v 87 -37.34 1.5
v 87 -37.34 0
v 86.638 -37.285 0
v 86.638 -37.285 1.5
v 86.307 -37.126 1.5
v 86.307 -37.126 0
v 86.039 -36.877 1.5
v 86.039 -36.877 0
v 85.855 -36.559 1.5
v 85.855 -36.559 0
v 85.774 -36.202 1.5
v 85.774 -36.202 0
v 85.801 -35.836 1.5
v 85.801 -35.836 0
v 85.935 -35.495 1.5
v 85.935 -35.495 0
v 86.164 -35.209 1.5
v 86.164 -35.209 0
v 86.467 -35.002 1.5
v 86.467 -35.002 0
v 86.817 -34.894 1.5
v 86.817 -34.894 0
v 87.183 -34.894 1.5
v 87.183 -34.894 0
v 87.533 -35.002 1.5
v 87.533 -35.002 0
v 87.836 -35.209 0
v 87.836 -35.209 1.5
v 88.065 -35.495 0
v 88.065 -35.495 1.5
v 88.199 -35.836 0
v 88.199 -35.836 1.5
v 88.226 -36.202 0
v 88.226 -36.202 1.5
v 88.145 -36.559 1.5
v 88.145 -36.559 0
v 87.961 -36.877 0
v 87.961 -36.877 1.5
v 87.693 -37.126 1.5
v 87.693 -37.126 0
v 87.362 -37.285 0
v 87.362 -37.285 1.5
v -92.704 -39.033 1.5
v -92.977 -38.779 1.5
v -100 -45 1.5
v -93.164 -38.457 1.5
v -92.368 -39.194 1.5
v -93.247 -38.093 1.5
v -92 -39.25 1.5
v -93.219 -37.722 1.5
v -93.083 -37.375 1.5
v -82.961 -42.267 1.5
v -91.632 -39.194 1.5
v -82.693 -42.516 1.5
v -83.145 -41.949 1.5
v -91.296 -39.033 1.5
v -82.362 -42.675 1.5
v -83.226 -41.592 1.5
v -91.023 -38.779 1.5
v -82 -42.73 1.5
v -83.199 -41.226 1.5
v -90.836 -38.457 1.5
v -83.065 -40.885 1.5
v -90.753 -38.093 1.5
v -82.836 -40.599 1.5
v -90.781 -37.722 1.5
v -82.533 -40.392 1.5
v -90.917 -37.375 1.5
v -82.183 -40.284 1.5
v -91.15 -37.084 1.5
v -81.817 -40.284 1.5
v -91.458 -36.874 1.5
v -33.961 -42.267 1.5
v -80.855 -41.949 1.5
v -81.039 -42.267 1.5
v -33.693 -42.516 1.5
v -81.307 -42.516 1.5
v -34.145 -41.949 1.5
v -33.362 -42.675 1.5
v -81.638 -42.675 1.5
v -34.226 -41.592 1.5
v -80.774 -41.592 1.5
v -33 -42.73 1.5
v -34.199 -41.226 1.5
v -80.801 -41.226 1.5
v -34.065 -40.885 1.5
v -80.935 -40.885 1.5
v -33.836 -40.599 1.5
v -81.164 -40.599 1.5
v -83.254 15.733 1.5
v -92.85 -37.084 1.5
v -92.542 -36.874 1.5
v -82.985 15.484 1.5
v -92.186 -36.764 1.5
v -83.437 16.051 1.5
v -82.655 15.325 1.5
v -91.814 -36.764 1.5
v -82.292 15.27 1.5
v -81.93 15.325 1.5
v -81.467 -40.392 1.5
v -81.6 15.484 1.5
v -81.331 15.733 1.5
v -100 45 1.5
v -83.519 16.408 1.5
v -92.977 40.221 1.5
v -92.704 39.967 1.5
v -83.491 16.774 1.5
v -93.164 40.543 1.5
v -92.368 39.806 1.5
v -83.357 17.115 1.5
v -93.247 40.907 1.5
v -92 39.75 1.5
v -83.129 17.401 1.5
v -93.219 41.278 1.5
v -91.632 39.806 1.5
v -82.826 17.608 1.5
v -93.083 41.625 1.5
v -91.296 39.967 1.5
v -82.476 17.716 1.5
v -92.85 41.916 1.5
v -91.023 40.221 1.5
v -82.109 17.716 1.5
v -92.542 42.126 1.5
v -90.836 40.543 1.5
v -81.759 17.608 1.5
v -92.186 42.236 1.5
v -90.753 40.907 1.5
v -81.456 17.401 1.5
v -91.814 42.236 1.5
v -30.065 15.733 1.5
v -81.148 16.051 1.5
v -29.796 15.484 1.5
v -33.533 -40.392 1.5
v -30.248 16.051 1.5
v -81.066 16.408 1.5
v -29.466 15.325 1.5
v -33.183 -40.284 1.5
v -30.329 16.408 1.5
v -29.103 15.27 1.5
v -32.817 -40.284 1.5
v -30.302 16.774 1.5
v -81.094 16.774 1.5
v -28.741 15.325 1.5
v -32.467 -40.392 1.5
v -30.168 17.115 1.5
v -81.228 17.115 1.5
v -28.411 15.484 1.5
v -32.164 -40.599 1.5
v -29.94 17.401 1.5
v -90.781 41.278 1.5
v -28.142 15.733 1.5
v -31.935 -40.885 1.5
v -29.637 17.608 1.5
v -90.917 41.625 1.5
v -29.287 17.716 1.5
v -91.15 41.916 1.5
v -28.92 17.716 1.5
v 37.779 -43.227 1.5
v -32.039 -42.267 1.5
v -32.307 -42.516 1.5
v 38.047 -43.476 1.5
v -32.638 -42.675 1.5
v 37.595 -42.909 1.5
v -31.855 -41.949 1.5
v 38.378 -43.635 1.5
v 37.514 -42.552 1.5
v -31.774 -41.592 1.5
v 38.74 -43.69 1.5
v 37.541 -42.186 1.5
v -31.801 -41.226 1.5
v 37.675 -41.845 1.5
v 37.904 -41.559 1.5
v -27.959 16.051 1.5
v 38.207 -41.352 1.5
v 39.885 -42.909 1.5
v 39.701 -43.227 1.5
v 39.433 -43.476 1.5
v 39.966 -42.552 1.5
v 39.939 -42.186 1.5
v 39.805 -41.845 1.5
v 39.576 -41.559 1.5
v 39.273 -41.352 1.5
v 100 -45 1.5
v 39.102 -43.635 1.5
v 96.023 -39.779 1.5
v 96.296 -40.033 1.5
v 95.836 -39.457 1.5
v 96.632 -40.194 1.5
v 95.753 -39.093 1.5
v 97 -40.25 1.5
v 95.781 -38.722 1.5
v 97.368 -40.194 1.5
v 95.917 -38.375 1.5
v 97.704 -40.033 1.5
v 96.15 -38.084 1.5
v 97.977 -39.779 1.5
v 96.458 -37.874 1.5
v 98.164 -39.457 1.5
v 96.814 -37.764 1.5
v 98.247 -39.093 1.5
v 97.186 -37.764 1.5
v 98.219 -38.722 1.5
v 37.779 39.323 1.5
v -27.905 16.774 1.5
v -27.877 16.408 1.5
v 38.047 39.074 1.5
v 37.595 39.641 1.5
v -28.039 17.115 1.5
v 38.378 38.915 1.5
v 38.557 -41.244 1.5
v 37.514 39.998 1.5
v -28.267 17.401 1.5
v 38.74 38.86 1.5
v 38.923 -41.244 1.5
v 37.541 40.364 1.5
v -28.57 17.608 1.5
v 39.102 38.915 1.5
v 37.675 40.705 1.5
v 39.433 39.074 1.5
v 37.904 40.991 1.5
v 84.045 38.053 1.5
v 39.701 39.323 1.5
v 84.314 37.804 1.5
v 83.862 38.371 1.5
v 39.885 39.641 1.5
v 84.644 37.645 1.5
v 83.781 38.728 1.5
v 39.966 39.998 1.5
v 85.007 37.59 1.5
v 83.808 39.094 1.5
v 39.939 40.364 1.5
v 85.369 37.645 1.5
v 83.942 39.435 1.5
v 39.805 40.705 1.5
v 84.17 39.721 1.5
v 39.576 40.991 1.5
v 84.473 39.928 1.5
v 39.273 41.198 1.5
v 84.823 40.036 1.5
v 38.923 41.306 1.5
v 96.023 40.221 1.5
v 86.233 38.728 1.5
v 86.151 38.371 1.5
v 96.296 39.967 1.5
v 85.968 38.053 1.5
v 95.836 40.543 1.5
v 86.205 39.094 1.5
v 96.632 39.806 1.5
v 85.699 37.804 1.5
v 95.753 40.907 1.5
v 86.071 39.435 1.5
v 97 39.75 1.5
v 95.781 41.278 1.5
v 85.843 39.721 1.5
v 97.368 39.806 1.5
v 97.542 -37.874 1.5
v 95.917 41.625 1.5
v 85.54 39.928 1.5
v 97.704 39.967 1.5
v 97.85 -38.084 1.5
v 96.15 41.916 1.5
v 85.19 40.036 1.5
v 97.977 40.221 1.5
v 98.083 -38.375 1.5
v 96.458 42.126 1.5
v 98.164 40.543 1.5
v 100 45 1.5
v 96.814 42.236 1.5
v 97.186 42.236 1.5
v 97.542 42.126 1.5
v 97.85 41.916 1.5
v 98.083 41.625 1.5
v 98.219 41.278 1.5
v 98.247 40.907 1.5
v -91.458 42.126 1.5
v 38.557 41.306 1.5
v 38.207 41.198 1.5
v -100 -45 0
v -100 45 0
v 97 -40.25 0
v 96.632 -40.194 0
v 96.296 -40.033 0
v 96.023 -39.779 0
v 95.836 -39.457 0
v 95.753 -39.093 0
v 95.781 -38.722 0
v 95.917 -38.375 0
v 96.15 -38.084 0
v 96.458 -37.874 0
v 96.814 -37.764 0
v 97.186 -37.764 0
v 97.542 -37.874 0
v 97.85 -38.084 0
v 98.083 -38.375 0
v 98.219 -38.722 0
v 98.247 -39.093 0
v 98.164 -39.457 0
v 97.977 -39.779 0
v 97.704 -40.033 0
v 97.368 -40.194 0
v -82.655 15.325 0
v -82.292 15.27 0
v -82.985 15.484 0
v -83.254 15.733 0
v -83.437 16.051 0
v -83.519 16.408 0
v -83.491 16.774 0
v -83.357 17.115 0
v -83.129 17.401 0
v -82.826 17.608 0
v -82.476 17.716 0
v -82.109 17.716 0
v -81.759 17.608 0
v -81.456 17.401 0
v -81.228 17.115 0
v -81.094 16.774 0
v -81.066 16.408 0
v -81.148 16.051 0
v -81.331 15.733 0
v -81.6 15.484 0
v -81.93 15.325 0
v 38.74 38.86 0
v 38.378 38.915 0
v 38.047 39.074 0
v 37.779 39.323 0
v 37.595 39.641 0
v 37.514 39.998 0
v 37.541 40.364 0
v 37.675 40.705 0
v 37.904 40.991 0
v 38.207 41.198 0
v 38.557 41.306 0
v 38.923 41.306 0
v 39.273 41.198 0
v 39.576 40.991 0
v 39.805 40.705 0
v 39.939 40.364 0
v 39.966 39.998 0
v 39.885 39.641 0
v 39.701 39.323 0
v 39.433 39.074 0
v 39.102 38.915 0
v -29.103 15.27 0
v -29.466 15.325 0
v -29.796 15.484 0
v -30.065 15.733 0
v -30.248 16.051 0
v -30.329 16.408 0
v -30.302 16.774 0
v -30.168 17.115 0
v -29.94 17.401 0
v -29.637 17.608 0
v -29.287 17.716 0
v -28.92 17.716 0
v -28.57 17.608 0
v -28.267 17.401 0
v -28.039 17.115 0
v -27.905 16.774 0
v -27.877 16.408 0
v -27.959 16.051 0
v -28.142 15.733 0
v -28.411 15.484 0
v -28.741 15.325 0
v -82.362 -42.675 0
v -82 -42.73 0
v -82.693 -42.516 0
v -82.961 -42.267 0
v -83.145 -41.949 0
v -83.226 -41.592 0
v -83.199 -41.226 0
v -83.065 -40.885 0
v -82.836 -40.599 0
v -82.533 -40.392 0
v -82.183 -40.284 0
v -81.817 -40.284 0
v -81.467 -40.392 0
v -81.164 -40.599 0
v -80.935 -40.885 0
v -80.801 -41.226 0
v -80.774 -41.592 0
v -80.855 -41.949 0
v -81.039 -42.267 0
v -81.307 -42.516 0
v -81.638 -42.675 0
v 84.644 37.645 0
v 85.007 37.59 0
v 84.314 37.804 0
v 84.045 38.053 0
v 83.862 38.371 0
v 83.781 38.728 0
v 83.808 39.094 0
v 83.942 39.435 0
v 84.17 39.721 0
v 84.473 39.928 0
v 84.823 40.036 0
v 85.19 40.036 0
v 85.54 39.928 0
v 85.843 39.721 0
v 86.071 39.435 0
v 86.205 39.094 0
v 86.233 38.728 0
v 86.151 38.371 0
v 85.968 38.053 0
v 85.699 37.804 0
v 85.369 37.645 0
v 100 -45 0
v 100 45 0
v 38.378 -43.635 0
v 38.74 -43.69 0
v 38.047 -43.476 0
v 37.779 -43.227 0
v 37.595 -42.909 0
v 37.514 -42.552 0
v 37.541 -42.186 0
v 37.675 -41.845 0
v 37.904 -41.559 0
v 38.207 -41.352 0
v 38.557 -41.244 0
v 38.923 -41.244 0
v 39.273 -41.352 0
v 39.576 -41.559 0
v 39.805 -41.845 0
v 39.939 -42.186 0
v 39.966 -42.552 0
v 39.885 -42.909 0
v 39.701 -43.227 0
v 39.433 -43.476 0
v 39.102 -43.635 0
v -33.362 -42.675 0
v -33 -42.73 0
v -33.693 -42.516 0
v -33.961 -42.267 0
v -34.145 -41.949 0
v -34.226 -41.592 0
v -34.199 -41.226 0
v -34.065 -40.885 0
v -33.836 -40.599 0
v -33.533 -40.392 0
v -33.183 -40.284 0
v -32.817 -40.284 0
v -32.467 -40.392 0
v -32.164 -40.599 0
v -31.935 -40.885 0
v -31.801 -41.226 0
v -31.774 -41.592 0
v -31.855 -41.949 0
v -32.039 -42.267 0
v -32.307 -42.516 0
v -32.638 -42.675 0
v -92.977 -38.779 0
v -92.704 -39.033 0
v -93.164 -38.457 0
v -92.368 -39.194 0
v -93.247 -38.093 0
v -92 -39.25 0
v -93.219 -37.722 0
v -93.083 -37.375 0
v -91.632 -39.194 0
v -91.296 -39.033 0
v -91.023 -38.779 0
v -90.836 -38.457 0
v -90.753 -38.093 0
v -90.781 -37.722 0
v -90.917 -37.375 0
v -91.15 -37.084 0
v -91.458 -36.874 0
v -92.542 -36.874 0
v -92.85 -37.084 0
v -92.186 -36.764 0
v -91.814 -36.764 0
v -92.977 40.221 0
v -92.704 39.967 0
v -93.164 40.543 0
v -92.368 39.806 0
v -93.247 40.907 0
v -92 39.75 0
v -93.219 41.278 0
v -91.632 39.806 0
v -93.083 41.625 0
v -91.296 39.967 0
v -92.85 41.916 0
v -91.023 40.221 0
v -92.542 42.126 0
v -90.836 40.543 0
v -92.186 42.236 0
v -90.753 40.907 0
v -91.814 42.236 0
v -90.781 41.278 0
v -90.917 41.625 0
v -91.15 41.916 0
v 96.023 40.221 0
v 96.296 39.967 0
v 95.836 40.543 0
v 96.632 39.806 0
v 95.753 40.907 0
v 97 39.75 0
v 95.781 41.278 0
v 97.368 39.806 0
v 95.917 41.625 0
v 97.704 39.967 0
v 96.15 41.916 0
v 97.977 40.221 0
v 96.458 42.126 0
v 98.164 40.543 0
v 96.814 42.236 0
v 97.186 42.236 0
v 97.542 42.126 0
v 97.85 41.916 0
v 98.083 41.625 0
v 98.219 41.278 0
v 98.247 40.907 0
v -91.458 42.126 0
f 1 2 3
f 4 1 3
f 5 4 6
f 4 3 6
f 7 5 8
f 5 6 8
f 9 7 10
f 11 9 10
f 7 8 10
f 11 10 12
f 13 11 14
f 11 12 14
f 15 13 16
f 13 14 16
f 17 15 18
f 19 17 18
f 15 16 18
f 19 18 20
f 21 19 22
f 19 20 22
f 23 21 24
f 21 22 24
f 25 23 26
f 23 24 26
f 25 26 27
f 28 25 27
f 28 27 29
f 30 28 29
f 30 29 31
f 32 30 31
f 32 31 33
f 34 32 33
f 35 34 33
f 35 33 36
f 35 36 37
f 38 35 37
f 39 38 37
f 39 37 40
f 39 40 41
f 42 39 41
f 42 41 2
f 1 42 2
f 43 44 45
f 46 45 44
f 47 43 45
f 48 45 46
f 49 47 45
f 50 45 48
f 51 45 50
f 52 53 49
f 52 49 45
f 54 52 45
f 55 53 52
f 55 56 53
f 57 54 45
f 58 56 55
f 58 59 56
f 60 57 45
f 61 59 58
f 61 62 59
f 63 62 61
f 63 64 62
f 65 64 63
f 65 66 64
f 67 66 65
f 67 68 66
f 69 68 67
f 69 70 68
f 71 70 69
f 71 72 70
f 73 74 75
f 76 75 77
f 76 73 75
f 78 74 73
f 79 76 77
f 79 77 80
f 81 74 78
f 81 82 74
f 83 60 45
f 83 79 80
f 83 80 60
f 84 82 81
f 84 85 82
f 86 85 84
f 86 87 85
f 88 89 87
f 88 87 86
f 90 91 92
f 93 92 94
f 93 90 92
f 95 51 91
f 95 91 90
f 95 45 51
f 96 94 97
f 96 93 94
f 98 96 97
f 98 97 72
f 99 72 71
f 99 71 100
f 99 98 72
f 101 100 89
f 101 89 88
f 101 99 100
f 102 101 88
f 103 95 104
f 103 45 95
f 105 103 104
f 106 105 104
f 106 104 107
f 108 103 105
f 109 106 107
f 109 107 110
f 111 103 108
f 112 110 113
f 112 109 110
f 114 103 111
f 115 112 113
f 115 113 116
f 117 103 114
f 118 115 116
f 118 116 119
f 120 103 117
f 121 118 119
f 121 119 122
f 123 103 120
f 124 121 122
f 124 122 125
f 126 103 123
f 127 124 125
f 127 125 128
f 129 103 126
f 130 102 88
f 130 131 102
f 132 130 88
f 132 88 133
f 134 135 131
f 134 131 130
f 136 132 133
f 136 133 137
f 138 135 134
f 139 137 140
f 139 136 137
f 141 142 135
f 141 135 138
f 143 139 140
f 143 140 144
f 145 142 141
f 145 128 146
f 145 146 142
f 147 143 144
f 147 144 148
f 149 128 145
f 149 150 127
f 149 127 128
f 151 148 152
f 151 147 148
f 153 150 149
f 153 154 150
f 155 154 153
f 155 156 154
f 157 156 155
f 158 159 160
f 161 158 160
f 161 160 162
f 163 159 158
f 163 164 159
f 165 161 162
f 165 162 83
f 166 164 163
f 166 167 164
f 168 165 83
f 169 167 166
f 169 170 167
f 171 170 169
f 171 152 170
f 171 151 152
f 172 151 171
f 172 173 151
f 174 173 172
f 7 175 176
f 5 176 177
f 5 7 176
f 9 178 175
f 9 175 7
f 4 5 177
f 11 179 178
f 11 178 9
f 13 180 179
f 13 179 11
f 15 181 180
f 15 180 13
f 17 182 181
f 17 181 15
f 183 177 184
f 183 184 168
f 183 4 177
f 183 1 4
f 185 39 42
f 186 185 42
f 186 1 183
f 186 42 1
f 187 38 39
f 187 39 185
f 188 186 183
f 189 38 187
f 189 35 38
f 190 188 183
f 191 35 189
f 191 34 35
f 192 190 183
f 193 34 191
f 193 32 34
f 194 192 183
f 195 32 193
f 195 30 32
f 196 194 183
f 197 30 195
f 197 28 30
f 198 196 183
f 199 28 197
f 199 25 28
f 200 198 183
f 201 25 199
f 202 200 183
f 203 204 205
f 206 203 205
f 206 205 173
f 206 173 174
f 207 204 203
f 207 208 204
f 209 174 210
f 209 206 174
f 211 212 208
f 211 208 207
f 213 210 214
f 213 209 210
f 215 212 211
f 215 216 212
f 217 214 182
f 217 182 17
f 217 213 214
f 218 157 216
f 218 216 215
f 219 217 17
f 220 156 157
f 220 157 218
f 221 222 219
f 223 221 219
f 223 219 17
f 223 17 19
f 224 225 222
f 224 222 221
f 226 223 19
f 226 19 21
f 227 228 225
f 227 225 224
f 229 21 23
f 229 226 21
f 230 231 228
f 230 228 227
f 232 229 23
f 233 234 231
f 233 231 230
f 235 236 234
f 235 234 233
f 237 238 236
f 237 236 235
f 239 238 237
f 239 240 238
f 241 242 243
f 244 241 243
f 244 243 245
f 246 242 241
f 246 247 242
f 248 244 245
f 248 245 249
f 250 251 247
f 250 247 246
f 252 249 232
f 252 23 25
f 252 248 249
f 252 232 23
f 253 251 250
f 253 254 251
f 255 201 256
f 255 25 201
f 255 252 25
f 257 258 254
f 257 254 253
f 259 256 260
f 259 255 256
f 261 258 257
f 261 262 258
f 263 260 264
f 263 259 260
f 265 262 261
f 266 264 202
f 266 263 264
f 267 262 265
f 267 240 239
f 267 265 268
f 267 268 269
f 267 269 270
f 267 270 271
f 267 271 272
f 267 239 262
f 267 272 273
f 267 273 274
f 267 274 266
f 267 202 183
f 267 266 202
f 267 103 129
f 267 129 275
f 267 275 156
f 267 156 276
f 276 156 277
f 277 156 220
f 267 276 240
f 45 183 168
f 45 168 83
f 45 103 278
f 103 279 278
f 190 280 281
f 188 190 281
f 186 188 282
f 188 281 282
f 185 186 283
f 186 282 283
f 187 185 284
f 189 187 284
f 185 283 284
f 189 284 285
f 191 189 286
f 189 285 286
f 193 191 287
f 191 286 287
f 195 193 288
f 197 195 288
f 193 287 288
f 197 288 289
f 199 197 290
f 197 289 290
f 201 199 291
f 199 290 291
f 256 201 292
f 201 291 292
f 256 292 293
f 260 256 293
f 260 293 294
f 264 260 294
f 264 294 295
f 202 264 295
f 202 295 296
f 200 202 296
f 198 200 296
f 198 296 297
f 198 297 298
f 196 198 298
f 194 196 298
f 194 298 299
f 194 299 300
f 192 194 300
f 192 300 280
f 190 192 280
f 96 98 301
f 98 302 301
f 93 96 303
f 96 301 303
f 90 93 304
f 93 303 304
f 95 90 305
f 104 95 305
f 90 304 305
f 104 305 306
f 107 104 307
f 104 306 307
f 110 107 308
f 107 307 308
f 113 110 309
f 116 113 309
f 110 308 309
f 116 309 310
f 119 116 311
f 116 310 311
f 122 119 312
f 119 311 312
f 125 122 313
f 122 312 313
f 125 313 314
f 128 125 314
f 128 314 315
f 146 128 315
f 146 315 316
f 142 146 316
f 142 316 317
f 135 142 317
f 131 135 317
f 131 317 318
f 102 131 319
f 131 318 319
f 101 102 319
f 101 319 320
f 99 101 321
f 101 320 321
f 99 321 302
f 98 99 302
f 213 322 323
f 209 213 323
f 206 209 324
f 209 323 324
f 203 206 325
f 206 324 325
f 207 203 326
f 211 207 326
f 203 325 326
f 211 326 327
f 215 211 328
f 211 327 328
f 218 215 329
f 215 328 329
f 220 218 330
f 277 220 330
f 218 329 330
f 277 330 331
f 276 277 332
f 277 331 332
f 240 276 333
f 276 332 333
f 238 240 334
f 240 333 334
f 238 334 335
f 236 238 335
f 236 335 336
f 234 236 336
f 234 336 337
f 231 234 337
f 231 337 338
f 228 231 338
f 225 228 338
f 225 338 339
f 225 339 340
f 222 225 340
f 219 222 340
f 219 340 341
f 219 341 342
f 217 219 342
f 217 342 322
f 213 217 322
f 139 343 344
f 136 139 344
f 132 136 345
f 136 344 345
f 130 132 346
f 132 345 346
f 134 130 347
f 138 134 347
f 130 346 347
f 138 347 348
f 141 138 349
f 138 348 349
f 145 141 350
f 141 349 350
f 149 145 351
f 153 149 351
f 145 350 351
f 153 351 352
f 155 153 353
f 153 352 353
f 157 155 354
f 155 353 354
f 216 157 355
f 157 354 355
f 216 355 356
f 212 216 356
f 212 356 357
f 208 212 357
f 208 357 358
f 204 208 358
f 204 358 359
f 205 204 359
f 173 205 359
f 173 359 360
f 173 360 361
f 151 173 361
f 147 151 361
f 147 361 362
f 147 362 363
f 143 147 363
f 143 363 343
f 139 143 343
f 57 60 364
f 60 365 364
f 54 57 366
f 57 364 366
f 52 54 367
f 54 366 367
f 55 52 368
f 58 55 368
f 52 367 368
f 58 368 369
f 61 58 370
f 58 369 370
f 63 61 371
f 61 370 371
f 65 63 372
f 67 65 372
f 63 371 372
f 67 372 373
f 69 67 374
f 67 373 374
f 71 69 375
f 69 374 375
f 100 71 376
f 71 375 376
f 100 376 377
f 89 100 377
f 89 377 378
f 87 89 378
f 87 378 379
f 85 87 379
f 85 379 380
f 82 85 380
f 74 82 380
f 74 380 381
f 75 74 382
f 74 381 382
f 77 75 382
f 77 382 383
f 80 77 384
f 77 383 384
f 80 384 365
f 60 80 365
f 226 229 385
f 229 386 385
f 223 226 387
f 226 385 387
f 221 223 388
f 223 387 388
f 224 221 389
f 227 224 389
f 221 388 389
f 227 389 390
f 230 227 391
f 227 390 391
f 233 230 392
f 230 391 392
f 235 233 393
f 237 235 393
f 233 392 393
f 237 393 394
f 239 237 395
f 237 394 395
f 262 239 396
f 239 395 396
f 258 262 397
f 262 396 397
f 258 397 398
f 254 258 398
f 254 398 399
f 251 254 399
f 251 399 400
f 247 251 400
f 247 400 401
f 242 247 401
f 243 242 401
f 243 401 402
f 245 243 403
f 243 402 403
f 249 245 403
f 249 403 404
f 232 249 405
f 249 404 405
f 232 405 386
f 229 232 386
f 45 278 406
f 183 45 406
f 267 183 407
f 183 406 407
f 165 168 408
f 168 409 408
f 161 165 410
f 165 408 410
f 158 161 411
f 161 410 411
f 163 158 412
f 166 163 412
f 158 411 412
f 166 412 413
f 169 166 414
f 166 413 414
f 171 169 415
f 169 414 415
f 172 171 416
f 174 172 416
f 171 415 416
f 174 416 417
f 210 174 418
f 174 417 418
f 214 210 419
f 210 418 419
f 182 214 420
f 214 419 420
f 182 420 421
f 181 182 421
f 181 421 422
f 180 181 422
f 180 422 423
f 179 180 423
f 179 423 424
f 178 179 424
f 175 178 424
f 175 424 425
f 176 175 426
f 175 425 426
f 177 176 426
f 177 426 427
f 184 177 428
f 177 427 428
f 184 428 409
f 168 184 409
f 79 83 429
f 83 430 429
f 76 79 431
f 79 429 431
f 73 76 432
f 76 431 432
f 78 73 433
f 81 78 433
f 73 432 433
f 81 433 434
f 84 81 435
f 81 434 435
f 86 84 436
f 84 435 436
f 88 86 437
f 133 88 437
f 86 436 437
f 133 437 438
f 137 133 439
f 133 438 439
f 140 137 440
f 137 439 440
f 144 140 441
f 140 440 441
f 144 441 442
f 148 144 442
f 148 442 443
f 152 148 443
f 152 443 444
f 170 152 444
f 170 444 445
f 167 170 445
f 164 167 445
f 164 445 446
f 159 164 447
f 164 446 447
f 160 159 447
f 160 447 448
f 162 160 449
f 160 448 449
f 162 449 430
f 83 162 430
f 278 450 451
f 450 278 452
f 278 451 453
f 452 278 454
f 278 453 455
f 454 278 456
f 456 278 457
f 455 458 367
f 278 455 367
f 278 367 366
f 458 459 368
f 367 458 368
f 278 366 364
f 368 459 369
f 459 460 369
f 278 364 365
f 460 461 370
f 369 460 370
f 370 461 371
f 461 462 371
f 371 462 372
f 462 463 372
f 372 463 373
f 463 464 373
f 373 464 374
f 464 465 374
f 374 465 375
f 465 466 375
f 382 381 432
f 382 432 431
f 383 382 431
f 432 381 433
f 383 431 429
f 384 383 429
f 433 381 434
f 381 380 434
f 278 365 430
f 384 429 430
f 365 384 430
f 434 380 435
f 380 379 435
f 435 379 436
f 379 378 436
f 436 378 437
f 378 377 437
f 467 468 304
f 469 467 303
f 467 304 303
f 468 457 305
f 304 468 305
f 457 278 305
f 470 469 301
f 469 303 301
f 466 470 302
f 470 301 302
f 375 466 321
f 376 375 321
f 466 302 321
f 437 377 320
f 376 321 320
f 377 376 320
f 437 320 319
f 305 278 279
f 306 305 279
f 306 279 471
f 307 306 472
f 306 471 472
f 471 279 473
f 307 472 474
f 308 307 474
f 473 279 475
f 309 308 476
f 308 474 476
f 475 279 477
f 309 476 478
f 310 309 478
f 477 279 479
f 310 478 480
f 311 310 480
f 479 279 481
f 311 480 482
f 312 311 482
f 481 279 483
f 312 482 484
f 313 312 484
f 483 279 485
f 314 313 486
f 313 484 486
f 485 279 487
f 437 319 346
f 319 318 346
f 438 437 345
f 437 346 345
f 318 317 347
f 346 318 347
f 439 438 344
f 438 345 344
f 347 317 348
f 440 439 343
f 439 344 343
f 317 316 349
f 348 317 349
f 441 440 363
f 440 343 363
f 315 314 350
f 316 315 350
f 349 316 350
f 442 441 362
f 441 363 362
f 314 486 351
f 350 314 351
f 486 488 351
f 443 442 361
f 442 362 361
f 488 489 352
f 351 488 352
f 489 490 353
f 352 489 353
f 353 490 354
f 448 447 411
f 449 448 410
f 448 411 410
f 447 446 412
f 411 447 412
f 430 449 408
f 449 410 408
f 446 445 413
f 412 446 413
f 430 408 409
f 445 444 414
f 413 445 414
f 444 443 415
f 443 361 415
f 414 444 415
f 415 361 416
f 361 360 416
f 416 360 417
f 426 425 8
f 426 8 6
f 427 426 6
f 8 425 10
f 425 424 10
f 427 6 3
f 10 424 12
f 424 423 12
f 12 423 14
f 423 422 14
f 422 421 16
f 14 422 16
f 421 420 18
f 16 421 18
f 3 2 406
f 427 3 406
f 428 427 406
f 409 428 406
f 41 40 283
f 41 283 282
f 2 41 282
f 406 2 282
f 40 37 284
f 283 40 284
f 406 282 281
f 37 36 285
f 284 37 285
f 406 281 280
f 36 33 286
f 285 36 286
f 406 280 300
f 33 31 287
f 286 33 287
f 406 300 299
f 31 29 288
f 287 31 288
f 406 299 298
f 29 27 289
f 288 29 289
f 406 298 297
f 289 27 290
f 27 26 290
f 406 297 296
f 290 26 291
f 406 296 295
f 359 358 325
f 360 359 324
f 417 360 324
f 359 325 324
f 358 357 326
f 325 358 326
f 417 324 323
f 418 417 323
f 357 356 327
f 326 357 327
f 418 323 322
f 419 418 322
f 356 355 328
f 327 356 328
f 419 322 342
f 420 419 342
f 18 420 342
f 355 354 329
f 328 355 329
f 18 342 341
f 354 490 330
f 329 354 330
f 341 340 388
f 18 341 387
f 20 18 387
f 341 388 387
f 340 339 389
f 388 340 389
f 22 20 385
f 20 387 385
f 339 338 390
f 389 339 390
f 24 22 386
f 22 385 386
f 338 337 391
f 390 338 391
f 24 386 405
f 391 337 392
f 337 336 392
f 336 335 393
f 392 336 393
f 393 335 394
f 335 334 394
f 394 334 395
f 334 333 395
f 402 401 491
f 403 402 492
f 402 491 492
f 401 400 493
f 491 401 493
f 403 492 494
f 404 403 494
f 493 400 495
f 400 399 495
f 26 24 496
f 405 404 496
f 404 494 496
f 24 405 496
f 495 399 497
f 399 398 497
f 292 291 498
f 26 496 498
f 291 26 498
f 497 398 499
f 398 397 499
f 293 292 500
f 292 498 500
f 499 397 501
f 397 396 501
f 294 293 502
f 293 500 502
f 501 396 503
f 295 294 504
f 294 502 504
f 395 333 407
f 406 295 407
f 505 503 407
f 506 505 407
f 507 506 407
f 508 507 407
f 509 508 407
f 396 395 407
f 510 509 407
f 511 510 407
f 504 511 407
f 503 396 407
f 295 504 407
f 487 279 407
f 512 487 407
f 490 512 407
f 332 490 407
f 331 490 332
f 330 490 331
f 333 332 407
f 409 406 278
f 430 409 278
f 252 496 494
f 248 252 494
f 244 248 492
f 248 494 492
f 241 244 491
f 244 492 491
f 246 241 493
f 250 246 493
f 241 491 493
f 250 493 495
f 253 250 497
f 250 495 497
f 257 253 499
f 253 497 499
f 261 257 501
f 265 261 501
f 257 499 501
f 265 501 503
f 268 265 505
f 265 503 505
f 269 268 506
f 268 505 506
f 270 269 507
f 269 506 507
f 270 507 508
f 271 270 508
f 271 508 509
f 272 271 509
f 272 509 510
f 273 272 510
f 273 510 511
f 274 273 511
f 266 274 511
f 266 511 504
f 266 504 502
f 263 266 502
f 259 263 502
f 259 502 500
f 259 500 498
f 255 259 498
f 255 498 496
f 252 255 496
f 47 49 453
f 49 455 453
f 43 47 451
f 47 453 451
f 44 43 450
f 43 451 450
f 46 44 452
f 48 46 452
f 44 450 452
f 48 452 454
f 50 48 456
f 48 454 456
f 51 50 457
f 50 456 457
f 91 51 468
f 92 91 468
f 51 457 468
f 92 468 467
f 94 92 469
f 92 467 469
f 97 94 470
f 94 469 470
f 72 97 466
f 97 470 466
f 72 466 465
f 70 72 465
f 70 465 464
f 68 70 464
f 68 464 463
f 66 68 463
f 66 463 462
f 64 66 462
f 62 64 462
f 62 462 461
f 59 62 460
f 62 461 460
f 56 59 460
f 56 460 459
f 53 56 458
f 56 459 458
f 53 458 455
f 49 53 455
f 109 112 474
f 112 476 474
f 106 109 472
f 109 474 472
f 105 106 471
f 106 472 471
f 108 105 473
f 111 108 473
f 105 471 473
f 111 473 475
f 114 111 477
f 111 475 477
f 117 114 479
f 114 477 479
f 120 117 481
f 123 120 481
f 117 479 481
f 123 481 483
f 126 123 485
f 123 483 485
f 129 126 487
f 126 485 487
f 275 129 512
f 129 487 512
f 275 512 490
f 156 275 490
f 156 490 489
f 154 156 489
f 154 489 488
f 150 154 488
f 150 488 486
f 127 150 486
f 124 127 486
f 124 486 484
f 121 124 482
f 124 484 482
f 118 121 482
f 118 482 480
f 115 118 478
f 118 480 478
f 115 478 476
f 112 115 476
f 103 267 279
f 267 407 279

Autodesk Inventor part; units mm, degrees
ref_plane "YZ Plane" through (0, 0, 0) normal (1, 0, 0) x (0, 1, 0)
ref_plane "XZ Plane" through (0, 0, 0) normal (0, 1, 0) x (-1, 0, 0)
ref_plane "XY Plane" through (0, 0, 0) normal (0, 0, 1) x (1, 0, 0)
sketch "スケッチ1" plane through (0, 0, 0) normal (0, 0, 1) x (1, 0, 0)
  line L0 (-100, -45) -> (100, -45)
  line L1 (100, -45) -> (100, 45)
  line L2 (100, 45) -> (-100, 45)
  line L3 (-100, 45) -> (-100, -45)
  line L4 (-100, -45) -> (100, 45) construction
  line L5 (100, -45) -> (-100, 45) construction
  point P0 (0, 0)
  dimension "d0" = 90
  dimension "d1" = 200
extrude "押し出し1" add sketch "スケッチ1" along normal blind 1.5
sketch "スケッチ2" plane through (0, 0, 1.5) normal (0, 0, 1) x (1, 0, 0)
  line L0 (100, -45) -> (100, 45) projected
  line L1 (-100, -45) -> (100, -45) projected
  point P0 (0, 0)
  point P1 (97, 41)
  point P2 (97, -39)
  dimension "d4" = 3
  dimension "d5" = 3
  dimension "d6" = 6
  dimension "d7" = 86
hole "穴1" at (97, 41, 1.5) at (97, -39, 1.5) direction (0, 0, -1) diameter 2.5 depth 8.8 tip angle 118
sketch "スケッチ3" plane through (0, 0, 1.5) normal (0, 0, 1) x (1, 0, 0)
  line L0 (-100, 45) -> (-100, -45) projected
  line L1 (-100, -45) -> (100, -45) projected
  point P0 (0, 0)
  point P1 (-92, 41)
  point P2 (-92, -38)
  dimension "d15" = 8
  dimension "d16" = 8
  dimension "d17" = 7
  dimension "d18" = 86
hole "穴2" at (-92, 41, 1.5) at (-92, -38, 1.5) direction (0, 0, -1) diameter 2.5 depth 8.8 tip angle 118
sketch "スケッチ4" plane through (0, 0, 1.5) normal (0, 0, 1) x (1, 0, 0)
  circle A0 centre (97, -39) radius 1.25 projected
  line L0 (-100, -45) -> (100, -45) projected
  point P0 (0, 0)
  point P1 (85.0067, 38.82)
  point P2 (87, -36.11)
  dimension "d26" = 10
  dimension "d27" = 8.89
  dimension "d28" = 74.93
hole "穴3" at (85.0067, 38.82, 1.5) at (87, -36.11, 1.5) direction (0, 0, -1) diameter 2.459 depth 8.8 tip angle 118 thread size "M3x0.5" class "6H" standard "ANSI Metric M Profile"
sketch "スケッチ5" plane through (0, 0, 1.5) normal (0, 0, 1) x (1, 0, 0)
  circle A0 centre (87, -36.11) radius 1.2295 projected
  line L0 (-100, -45) -> (100, -45) projected
  point P0 (0, 0)
  point P1 (38.74, -42.46)
  point P2 (38.74, 40.09)
  dimension "d36" = 48.26
  dimension "d37" = 2.54
  dimension "d38" = 82.55
hole "穴4" at (38.74, -42.46, 1.5) at (38.74, 40.09, 1.5) direction (0, 0, -1) diameter 2.459 depth 8.8 tip angle 118 thread size "M3x0.5" class "6H" standard "ANSI Metric M Profile"
sketch "スケッチ6" plane through (0, 0, 1.5) normal (0, 0, 1) x (1, 0, 0)
  line L0 (-100, -45) -> (100, -45) projected
  circle A0 centre (-92, -38) radius 1.25 projected
  point P0 (0, 0)
  point P1 (-82.2925, 16.5)
  point P2 (-29.1034, 16.5)
  point P3 (-82, -41.5)
  point P4 (-33, -41.5)
  dimension "d46" = 3.5
  dimension "d47" = 10
  dimension "d48" = 49
  dimension "d49" = 3.5
  dimension "d50" = 58
  dimension "d51" = 58
hole "穴5" at (-82.2925, 16.5, 1.5) at (-29.1034, 16.5, 1.5) at (-82, -41.5, 1.5) at (-33, -41.5, 1.5) direction (0, 0, -1) diameter 2.459 depth 8.8 tip angle 118 thread size "M3x0.5" class "6H" standard "ANSI Metric M Profile"
properties part number "20220620_知能ロボットコンテスト二階部分"
